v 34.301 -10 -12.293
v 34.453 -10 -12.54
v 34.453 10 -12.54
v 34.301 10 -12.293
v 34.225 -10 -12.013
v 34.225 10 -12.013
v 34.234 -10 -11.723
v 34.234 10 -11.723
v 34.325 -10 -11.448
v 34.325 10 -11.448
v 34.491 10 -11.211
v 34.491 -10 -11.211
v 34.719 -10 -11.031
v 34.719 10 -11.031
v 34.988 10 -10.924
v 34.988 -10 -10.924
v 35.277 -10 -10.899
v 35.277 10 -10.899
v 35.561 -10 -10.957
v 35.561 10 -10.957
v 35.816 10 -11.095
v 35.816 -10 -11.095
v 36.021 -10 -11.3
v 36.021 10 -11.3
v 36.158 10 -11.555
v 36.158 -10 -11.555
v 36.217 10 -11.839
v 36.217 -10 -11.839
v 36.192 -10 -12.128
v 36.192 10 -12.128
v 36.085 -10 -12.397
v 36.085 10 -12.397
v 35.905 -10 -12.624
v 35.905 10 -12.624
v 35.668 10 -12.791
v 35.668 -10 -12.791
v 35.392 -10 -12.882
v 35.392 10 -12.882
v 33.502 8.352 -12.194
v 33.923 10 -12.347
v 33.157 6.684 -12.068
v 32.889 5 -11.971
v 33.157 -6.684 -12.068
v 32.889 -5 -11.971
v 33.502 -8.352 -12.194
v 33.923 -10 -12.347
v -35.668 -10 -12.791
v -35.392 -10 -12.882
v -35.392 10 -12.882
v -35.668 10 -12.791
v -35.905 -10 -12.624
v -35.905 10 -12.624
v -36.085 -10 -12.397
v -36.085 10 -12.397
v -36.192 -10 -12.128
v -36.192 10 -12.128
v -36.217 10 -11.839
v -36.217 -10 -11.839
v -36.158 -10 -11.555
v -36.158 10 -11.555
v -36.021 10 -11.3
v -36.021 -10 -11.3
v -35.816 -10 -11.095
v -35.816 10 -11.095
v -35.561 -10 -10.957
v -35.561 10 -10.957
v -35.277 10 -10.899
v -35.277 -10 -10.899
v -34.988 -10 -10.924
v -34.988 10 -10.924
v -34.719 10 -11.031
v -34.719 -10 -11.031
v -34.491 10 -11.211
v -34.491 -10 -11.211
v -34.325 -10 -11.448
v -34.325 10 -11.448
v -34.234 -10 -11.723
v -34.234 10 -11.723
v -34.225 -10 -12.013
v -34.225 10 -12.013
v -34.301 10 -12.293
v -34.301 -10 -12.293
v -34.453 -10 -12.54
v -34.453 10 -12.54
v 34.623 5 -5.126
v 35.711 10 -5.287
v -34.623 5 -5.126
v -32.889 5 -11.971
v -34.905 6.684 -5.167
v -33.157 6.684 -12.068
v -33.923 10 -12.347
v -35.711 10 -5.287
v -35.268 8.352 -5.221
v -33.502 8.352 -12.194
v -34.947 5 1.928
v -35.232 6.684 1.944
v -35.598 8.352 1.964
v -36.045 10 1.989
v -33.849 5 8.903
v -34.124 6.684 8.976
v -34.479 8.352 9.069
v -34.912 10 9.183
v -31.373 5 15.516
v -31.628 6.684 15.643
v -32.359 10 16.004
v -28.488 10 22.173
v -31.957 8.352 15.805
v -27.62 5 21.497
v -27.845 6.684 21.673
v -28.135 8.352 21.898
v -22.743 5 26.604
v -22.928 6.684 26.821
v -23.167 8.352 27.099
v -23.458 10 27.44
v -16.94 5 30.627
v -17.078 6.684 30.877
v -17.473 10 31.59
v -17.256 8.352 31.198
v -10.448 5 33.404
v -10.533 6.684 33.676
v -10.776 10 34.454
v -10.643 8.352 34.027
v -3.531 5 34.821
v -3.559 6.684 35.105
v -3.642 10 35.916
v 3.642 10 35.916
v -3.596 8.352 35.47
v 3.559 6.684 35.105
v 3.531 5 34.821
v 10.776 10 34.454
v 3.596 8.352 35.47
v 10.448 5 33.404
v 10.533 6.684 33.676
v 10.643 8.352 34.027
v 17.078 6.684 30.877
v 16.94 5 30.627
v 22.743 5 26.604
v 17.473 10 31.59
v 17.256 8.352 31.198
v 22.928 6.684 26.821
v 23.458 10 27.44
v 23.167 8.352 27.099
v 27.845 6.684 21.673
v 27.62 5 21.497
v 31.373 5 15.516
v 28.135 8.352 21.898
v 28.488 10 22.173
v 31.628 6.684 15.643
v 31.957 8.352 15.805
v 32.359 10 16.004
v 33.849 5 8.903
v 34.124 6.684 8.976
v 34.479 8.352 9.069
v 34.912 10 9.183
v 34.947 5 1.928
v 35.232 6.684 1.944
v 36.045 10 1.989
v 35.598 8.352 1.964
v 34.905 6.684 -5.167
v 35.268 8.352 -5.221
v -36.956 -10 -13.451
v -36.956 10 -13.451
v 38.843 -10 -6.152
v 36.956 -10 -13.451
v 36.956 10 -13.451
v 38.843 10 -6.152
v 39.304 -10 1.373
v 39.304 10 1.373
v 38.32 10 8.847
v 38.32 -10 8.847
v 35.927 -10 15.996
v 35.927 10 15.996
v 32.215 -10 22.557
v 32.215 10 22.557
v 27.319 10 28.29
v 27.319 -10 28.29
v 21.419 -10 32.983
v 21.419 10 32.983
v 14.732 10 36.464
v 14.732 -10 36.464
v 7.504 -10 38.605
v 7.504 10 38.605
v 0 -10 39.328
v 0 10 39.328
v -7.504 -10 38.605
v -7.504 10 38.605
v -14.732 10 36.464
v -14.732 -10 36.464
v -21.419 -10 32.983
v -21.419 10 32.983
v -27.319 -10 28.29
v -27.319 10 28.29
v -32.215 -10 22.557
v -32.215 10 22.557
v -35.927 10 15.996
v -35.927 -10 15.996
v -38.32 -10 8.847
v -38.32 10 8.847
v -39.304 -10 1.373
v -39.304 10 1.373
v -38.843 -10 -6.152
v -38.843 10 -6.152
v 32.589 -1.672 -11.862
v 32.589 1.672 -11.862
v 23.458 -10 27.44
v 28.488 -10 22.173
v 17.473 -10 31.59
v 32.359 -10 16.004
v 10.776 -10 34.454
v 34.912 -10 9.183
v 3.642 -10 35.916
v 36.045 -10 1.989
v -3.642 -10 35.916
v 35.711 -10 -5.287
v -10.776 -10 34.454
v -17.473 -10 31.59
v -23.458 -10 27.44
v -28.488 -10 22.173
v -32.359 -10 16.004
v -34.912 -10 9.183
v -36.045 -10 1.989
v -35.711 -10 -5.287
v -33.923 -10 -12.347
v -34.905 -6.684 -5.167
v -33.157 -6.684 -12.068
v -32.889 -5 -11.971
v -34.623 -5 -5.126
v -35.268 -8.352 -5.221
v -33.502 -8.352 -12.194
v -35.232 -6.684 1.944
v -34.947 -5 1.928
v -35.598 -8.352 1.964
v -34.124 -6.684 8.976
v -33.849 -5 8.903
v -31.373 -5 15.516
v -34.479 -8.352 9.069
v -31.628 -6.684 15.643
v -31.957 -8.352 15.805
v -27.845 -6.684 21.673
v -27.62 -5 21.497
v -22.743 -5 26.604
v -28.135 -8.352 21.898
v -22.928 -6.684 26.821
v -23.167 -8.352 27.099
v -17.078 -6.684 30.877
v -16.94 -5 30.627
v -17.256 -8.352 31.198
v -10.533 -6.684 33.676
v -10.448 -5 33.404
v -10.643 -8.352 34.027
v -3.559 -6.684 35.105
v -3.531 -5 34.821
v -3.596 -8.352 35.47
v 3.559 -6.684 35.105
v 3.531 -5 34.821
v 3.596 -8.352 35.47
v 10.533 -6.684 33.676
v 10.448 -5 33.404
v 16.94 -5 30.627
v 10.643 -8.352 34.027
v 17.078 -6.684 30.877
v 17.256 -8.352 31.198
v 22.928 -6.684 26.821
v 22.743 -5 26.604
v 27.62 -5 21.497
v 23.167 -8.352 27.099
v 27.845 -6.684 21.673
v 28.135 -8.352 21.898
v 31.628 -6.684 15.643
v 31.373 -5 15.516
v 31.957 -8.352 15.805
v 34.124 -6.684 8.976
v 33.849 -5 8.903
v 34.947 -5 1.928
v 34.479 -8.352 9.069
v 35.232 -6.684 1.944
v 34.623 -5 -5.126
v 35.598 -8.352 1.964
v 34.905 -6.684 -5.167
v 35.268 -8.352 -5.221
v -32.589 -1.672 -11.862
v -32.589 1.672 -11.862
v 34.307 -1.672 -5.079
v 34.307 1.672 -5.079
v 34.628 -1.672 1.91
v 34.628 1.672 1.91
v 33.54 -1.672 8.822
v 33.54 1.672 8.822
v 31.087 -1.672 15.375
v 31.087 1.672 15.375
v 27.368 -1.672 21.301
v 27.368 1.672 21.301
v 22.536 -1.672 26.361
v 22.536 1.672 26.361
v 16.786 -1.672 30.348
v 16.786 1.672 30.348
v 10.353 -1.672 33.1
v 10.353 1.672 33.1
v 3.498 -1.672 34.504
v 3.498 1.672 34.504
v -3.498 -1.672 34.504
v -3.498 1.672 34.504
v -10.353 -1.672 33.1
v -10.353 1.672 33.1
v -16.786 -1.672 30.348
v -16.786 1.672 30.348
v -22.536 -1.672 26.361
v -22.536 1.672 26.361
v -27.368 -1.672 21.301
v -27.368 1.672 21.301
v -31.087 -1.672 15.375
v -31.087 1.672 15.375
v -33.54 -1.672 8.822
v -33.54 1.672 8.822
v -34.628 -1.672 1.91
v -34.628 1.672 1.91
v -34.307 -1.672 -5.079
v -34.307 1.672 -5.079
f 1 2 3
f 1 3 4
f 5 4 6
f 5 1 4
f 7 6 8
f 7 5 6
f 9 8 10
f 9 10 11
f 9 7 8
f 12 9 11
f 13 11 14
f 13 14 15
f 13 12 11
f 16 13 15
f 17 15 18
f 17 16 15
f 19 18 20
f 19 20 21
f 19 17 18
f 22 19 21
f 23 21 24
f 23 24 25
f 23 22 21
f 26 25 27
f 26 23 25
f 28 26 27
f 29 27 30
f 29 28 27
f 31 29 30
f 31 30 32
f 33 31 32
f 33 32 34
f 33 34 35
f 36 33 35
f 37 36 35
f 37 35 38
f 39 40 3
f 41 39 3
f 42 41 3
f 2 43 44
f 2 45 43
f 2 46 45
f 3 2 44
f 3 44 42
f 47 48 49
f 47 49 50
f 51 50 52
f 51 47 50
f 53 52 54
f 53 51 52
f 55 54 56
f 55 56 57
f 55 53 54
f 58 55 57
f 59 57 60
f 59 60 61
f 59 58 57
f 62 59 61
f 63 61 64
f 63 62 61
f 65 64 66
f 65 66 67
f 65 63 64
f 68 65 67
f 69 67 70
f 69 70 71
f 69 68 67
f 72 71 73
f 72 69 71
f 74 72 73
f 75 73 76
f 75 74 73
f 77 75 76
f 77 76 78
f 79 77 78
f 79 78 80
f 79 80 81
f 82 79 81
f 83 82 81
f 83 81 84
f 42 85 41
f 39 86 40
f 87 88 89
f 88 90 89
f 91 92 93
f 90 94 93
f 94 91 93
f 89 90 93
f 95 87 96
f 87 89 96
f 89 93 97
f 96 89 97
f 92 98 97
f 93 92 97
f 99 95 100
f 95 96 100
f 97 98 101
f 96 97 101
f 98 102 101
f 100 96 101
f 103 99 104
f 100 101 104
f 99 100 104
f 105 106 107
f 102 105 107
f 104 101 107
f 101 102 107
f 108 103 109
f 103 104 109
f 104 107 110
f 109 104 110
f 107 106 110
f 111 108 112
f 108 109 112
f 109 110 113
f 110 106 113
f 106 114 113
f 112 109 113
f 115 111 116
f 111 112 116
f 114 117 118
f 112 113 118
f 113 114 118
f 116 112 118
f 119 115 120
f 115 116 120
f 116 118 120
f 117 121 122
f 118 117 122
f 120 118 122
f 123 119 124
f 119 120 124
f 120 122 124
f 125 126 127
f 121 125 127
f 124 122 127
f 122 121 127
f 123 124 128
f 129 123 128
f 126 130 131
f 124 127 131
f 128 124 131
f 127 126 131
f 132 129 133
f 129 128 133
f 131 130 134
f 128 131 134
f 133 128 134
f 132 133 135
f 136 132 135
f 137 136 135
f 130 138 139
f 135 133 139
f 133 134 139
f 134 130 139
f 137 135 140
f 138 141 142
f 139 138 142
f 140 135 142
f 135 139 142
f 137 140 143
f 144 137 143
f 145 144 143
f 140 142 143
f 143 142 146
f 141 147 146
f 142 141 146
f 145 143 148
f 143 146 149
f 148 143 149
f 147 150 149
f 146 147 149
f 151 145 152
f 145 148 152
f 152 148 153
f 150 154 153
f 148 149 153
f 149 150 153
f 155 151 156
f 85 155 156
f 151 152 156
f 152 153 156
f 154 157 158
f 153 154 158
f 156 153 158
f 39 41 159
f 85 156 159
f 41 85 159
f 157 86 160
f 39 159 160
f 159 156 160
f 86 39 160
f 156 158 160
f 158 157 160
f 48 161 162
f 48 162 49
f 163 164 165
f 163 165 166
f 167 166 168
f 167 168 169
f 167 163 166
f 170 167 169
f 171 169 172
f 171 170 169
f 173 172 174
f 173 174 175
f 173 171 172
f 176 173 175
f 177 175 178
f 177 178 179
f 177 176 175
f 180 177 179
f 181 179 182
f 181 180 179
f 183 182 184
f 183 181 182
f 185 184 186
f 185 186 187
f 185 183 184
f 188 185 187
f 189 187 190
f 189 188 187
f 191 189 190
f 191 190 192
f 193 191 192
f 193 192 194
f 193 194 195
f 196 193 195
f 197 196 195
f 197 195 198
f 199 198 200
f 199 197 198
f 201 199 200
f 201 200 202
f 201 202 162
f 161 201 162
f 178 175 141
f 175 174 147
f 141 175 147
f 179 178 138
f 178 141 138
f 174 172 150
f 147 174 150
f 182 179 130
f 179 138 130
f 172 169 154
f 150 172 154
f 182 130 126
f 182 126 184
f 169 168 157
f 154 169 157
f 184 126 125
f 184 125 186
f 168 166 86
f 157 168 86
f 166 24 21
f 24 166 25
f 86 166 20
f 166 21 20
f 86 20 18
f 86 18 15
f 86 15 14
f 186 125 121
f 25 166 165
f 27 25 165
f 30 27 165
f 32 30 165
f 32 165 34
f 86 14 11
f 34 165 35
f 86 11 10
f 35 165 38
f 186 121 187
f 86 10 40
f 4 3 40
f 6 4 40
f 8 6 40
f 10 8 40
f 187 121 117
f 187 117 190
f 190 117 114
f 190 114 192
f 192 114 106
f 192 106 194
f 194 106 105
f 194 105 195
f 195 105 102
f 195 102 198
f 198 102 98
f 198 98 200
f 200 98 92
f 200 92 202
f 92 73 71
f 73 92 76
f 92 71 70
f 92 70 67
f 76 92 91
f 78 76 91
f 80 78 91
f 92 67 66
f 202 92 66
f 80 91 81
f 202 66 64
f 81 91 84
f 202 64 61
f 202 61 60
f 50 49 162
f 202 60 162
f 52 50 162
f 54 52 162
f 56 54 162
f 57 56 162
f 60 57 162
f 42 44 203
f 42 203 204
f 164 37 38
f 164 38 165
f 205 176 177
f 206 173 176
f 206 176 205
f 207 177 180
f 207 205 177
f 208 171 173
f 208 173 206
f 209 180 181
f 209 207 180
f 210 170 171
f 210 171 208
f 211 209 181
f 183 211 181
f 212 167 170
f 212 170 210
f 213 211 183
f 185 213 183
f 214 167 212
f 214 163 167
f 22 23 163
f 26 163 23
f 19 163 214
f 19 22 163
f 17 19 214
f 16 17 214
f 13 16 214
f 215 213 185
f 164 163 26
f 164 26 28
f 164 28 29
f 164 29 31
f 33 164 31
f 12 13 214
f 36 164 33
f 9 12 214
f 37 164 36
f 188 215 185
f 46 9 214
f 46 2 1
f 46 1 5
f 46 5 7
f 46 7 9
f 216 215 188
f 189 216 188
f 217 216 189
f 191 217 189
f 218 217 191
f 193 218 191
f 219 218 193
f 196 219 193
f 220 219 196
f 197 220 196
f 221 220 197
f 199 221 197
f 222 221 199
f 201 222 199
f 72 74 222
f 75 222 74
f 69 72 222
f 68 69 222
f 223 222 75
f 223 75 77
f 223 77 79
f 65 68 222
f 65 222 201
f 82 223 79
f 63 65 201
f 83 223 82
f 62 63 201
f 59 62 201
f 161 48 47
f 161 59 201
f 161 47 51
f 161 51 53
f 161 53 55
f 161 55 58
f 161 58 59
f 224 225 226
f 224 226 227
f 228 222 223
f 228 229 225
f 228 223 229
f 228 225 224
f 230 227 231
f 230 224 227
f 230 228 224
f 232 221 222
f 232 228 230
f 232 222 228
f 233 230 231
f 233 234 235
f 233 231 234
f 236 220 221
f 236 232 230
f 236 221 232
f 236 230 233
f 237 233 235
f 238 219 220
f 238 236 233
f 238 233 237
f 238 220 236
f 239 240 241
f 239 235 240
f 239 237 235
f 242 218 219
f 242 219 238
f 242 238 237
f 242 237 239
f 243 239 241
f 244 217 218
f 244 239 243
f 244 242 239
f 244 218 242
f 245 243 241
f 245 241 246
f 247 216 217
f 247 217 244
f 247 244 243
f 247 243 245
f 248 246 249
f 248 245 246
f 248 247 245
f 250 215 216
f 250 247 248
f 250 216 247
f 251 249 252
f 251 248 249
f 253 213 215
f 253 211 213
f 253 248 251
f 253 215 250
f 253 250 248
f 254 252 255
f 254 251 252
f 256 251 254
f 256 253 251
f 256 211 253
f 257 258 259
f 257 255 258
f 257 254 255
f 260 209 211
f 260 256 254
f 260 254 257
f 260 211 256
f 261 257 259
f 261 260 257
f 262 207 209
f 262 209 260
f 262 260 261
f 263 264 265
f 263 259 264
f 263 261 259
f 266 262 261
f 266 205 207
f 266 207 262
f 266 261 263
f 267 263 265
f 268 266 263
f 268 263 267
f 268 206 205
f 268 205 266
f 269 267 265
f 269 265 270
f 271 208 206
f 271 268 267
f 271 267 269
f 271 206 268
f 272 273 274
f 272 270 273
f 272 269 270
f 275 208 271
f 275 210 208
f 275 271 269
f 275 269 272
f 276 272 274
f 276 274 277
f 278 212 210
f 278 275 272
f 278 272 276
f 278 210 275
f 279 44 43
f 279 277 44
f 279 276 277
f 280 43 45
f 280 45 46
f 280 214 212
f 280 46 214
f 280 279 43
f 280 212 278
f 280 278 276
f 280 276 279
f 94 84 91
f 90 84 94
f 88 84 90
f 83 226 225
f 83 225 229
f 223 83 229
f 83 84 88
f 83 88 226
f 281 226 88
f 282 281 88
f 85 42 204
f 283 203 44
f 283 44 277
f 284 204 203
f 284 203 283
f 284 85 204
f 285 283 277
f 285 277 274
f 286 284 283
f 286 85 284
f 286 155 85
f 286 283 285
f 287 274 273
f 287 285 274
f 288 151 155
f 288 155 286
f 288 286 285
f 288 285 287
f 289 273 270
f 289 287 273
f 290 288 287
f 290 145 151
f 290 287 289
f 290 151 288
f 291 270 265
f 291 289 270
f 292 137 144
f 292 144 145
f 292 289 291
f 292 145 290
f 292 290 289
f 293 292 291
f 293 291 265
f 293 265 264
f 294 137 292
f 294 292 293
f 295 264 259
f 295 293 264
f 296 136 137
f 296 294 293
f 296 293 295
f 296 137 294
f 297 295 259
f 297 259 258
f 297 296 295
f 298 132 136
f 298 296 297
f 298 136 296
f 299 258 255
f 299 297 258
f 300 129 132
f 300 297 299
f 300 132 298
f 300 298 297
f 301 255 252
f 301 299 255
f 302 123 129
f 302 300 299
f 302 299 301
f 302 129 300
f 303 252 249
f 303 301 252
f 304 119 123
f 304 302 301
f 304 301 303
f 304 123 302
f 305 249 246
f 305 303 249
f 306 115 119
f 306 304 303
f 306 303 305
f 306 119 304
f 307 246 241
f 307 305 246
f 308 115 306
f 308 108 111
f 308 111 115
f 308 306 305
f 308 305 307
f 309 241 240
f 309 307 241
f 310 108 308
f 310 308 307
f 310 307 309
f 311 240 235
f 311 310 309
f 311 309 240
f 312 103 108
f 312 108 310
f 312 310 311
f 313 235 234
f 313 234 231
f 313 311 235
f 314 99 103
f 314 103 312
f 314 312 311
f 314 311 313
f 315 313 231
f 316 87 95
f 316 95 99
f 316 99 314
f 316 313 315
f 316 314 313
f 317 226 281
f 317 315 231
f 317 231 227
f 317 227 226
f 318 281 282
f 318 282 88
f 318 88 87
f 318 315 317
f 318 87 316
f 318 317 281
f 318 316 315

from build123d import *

# Parameters (mm, degrees)
FUNDAMETAL_DIMENSIONS_DEPTH           = 10
FUNDAMETAL_DIMENSIONS_DEPTH_BACK      = 10
ROUND_INSIDE_CUT_ANGLE                = 110
ROUND_INSIDE_CUT_OTHER_WAY_ANGLE      = 110
ROUND_INSIDE_EXTRUDED_ANGLE           = 110
ROUND_INSIDE_EXTRUDED_OTHER_WAY_ANGLE = 110


with BuildPart() as part:
    # Sketch3 → Fundametal Dimensions (new, two sides: drawn at the far end of the back side and taken through both)
    with BuildSketch(Plane(origin=(0, 0, 0), x_dir=(1, 0, 0), z_dir=(0, 1, 0)).offset(-FUNDAMETAL_DIMENSIONS_DEPTH_BACK)):
        with BuildLine():
            Line((-36.955795179, 13.450809429), (-35.392364764, 12.881767294))
            ThreePointArc((-35.392364764, 12.881767294), (-35.560736729, 10.95726692), (-34.452672143, 12.539747151))
            Line((-34.452672143, 12.539747151), (-32.889241728, 11.970705016))
            ThreePointArc((-32.889241728, 11.970705016), (0, -35), (32.889241728, 11.970705016))
            Line((32.889241728, 11.970705016), (34.452672143, 12.539747151))
            ThreePointArc((34.452672143, 12.539747151), (35.560736729, 10.95726692), (35.392364764, 12.881767294))
            Line((35.392364764, 12.881767294), (36.955795179, 13.450809429))
            ThreePointArc((36.955795179, 13.450809429), (0, -39.327535793), (-36.955795179, 13.450809429))
        make_face()
    extrude(amount=FUNDAMETAL_DIMENSIONS_DEPTH + FUNDAMETAL_DIMENSIONS_DEPTH_BACK)

    # Sketch9 → Round Inside Cut (revolve, cut)
    with BuildSketch(Plane(origin=(0, 0, 0), x_dir=(0, 0, -1), z_dir=(1, 0, 0))):
        with BuildLine():
            Line((-36.099996489, 10), (-35, 10))
            Line((-35, 10), (-35, 5))
            ThreePointArc((-35, 5), (-35.45845478, 7.520139498), (-36.099996489, 10))
        make_face()
        with BuildLine():
            Line((-36.099996489, -10), (-35, -10))
            Line((-35, -10), (-35, -5))
            ThreePointArc((-35, -5), (-35.45845478, -7.520139498), (-36.099996489, -10))
        make_face()
    revolve(axis=Axis((0, -20, 0), (0, 1, 0)), revolution_arc=ROUND_INSIDE_CUT_ANGLE, mode=Mode.SUBTRACT)

    # Sketch9 → Round Inside Cut other way (revolve, cut)
    with BuildSketch(Plane(origin=(0, 0, 0), x_dir=(0, 0, -1), z_dir=(1, 0, 0))):
        with BuildLine():
            Line((-36.099996489, 10), (-35, 10))
            Line((-35, 10), (-35, 5))
            ThreePointArc((-35, 5), (-35.45845478, 7.520139498), (-36.099996489, 10))
        make_face()
        with BuildLine():
            Line((-36.099996489, -10), (-35, -10))
            Line((-35, -10), (-35, -5))
            ThreePointArc((-35, -5), (-35.45845478, -7.520139498), (-36.099996489, -10))
        make_face()
    revolve(axis=Axis((0, -20, 0), (0, -1, 0)), revolution_arc=ROUND_INSIDE_CUT_OTHER_WAY_ANGLE, mode=Mode.SUBTRACT)

    # Sketch10 → Round Inside Extruded (revolve)
    with BuildSketch(Plane(origin=(0, 0, 0), x_dir=(0, 0, -1), z_dir=(1, 0, 0))):
        with BuildLine():
            Line((-35, 5), (-35, -5))
            ThreePointArc((-35, -5), (-34.641016151, 0), (-35, 5))
        make_face()
    revolve(axis=Axis((0, -20, 0), (0, 1, 0)), revolution_arc=ROUND_INSIDE_EXTRUDED_ANGLE)

    # Sketch10 → Round Inside Extruded other way (revolve)
    with BuildSketch(Plane(origin=(0, 0, 0), x_dir=(0, 0, -1), z_dir=(1, 0, 0))):
        with BuildLine():
            Line((-35, 5), (-35, -5))
            ThreePointArc((-35, -5), (-34.641016151, 0), (-35, 5))
        make_face()
    revolve(axis=Axis((0, -20, 0), (0, -1, 0)), revolution_arc=ROUND_INSIDE_EXTRUDED_OTHER_WAY_ANGLE)


solid = part.part
